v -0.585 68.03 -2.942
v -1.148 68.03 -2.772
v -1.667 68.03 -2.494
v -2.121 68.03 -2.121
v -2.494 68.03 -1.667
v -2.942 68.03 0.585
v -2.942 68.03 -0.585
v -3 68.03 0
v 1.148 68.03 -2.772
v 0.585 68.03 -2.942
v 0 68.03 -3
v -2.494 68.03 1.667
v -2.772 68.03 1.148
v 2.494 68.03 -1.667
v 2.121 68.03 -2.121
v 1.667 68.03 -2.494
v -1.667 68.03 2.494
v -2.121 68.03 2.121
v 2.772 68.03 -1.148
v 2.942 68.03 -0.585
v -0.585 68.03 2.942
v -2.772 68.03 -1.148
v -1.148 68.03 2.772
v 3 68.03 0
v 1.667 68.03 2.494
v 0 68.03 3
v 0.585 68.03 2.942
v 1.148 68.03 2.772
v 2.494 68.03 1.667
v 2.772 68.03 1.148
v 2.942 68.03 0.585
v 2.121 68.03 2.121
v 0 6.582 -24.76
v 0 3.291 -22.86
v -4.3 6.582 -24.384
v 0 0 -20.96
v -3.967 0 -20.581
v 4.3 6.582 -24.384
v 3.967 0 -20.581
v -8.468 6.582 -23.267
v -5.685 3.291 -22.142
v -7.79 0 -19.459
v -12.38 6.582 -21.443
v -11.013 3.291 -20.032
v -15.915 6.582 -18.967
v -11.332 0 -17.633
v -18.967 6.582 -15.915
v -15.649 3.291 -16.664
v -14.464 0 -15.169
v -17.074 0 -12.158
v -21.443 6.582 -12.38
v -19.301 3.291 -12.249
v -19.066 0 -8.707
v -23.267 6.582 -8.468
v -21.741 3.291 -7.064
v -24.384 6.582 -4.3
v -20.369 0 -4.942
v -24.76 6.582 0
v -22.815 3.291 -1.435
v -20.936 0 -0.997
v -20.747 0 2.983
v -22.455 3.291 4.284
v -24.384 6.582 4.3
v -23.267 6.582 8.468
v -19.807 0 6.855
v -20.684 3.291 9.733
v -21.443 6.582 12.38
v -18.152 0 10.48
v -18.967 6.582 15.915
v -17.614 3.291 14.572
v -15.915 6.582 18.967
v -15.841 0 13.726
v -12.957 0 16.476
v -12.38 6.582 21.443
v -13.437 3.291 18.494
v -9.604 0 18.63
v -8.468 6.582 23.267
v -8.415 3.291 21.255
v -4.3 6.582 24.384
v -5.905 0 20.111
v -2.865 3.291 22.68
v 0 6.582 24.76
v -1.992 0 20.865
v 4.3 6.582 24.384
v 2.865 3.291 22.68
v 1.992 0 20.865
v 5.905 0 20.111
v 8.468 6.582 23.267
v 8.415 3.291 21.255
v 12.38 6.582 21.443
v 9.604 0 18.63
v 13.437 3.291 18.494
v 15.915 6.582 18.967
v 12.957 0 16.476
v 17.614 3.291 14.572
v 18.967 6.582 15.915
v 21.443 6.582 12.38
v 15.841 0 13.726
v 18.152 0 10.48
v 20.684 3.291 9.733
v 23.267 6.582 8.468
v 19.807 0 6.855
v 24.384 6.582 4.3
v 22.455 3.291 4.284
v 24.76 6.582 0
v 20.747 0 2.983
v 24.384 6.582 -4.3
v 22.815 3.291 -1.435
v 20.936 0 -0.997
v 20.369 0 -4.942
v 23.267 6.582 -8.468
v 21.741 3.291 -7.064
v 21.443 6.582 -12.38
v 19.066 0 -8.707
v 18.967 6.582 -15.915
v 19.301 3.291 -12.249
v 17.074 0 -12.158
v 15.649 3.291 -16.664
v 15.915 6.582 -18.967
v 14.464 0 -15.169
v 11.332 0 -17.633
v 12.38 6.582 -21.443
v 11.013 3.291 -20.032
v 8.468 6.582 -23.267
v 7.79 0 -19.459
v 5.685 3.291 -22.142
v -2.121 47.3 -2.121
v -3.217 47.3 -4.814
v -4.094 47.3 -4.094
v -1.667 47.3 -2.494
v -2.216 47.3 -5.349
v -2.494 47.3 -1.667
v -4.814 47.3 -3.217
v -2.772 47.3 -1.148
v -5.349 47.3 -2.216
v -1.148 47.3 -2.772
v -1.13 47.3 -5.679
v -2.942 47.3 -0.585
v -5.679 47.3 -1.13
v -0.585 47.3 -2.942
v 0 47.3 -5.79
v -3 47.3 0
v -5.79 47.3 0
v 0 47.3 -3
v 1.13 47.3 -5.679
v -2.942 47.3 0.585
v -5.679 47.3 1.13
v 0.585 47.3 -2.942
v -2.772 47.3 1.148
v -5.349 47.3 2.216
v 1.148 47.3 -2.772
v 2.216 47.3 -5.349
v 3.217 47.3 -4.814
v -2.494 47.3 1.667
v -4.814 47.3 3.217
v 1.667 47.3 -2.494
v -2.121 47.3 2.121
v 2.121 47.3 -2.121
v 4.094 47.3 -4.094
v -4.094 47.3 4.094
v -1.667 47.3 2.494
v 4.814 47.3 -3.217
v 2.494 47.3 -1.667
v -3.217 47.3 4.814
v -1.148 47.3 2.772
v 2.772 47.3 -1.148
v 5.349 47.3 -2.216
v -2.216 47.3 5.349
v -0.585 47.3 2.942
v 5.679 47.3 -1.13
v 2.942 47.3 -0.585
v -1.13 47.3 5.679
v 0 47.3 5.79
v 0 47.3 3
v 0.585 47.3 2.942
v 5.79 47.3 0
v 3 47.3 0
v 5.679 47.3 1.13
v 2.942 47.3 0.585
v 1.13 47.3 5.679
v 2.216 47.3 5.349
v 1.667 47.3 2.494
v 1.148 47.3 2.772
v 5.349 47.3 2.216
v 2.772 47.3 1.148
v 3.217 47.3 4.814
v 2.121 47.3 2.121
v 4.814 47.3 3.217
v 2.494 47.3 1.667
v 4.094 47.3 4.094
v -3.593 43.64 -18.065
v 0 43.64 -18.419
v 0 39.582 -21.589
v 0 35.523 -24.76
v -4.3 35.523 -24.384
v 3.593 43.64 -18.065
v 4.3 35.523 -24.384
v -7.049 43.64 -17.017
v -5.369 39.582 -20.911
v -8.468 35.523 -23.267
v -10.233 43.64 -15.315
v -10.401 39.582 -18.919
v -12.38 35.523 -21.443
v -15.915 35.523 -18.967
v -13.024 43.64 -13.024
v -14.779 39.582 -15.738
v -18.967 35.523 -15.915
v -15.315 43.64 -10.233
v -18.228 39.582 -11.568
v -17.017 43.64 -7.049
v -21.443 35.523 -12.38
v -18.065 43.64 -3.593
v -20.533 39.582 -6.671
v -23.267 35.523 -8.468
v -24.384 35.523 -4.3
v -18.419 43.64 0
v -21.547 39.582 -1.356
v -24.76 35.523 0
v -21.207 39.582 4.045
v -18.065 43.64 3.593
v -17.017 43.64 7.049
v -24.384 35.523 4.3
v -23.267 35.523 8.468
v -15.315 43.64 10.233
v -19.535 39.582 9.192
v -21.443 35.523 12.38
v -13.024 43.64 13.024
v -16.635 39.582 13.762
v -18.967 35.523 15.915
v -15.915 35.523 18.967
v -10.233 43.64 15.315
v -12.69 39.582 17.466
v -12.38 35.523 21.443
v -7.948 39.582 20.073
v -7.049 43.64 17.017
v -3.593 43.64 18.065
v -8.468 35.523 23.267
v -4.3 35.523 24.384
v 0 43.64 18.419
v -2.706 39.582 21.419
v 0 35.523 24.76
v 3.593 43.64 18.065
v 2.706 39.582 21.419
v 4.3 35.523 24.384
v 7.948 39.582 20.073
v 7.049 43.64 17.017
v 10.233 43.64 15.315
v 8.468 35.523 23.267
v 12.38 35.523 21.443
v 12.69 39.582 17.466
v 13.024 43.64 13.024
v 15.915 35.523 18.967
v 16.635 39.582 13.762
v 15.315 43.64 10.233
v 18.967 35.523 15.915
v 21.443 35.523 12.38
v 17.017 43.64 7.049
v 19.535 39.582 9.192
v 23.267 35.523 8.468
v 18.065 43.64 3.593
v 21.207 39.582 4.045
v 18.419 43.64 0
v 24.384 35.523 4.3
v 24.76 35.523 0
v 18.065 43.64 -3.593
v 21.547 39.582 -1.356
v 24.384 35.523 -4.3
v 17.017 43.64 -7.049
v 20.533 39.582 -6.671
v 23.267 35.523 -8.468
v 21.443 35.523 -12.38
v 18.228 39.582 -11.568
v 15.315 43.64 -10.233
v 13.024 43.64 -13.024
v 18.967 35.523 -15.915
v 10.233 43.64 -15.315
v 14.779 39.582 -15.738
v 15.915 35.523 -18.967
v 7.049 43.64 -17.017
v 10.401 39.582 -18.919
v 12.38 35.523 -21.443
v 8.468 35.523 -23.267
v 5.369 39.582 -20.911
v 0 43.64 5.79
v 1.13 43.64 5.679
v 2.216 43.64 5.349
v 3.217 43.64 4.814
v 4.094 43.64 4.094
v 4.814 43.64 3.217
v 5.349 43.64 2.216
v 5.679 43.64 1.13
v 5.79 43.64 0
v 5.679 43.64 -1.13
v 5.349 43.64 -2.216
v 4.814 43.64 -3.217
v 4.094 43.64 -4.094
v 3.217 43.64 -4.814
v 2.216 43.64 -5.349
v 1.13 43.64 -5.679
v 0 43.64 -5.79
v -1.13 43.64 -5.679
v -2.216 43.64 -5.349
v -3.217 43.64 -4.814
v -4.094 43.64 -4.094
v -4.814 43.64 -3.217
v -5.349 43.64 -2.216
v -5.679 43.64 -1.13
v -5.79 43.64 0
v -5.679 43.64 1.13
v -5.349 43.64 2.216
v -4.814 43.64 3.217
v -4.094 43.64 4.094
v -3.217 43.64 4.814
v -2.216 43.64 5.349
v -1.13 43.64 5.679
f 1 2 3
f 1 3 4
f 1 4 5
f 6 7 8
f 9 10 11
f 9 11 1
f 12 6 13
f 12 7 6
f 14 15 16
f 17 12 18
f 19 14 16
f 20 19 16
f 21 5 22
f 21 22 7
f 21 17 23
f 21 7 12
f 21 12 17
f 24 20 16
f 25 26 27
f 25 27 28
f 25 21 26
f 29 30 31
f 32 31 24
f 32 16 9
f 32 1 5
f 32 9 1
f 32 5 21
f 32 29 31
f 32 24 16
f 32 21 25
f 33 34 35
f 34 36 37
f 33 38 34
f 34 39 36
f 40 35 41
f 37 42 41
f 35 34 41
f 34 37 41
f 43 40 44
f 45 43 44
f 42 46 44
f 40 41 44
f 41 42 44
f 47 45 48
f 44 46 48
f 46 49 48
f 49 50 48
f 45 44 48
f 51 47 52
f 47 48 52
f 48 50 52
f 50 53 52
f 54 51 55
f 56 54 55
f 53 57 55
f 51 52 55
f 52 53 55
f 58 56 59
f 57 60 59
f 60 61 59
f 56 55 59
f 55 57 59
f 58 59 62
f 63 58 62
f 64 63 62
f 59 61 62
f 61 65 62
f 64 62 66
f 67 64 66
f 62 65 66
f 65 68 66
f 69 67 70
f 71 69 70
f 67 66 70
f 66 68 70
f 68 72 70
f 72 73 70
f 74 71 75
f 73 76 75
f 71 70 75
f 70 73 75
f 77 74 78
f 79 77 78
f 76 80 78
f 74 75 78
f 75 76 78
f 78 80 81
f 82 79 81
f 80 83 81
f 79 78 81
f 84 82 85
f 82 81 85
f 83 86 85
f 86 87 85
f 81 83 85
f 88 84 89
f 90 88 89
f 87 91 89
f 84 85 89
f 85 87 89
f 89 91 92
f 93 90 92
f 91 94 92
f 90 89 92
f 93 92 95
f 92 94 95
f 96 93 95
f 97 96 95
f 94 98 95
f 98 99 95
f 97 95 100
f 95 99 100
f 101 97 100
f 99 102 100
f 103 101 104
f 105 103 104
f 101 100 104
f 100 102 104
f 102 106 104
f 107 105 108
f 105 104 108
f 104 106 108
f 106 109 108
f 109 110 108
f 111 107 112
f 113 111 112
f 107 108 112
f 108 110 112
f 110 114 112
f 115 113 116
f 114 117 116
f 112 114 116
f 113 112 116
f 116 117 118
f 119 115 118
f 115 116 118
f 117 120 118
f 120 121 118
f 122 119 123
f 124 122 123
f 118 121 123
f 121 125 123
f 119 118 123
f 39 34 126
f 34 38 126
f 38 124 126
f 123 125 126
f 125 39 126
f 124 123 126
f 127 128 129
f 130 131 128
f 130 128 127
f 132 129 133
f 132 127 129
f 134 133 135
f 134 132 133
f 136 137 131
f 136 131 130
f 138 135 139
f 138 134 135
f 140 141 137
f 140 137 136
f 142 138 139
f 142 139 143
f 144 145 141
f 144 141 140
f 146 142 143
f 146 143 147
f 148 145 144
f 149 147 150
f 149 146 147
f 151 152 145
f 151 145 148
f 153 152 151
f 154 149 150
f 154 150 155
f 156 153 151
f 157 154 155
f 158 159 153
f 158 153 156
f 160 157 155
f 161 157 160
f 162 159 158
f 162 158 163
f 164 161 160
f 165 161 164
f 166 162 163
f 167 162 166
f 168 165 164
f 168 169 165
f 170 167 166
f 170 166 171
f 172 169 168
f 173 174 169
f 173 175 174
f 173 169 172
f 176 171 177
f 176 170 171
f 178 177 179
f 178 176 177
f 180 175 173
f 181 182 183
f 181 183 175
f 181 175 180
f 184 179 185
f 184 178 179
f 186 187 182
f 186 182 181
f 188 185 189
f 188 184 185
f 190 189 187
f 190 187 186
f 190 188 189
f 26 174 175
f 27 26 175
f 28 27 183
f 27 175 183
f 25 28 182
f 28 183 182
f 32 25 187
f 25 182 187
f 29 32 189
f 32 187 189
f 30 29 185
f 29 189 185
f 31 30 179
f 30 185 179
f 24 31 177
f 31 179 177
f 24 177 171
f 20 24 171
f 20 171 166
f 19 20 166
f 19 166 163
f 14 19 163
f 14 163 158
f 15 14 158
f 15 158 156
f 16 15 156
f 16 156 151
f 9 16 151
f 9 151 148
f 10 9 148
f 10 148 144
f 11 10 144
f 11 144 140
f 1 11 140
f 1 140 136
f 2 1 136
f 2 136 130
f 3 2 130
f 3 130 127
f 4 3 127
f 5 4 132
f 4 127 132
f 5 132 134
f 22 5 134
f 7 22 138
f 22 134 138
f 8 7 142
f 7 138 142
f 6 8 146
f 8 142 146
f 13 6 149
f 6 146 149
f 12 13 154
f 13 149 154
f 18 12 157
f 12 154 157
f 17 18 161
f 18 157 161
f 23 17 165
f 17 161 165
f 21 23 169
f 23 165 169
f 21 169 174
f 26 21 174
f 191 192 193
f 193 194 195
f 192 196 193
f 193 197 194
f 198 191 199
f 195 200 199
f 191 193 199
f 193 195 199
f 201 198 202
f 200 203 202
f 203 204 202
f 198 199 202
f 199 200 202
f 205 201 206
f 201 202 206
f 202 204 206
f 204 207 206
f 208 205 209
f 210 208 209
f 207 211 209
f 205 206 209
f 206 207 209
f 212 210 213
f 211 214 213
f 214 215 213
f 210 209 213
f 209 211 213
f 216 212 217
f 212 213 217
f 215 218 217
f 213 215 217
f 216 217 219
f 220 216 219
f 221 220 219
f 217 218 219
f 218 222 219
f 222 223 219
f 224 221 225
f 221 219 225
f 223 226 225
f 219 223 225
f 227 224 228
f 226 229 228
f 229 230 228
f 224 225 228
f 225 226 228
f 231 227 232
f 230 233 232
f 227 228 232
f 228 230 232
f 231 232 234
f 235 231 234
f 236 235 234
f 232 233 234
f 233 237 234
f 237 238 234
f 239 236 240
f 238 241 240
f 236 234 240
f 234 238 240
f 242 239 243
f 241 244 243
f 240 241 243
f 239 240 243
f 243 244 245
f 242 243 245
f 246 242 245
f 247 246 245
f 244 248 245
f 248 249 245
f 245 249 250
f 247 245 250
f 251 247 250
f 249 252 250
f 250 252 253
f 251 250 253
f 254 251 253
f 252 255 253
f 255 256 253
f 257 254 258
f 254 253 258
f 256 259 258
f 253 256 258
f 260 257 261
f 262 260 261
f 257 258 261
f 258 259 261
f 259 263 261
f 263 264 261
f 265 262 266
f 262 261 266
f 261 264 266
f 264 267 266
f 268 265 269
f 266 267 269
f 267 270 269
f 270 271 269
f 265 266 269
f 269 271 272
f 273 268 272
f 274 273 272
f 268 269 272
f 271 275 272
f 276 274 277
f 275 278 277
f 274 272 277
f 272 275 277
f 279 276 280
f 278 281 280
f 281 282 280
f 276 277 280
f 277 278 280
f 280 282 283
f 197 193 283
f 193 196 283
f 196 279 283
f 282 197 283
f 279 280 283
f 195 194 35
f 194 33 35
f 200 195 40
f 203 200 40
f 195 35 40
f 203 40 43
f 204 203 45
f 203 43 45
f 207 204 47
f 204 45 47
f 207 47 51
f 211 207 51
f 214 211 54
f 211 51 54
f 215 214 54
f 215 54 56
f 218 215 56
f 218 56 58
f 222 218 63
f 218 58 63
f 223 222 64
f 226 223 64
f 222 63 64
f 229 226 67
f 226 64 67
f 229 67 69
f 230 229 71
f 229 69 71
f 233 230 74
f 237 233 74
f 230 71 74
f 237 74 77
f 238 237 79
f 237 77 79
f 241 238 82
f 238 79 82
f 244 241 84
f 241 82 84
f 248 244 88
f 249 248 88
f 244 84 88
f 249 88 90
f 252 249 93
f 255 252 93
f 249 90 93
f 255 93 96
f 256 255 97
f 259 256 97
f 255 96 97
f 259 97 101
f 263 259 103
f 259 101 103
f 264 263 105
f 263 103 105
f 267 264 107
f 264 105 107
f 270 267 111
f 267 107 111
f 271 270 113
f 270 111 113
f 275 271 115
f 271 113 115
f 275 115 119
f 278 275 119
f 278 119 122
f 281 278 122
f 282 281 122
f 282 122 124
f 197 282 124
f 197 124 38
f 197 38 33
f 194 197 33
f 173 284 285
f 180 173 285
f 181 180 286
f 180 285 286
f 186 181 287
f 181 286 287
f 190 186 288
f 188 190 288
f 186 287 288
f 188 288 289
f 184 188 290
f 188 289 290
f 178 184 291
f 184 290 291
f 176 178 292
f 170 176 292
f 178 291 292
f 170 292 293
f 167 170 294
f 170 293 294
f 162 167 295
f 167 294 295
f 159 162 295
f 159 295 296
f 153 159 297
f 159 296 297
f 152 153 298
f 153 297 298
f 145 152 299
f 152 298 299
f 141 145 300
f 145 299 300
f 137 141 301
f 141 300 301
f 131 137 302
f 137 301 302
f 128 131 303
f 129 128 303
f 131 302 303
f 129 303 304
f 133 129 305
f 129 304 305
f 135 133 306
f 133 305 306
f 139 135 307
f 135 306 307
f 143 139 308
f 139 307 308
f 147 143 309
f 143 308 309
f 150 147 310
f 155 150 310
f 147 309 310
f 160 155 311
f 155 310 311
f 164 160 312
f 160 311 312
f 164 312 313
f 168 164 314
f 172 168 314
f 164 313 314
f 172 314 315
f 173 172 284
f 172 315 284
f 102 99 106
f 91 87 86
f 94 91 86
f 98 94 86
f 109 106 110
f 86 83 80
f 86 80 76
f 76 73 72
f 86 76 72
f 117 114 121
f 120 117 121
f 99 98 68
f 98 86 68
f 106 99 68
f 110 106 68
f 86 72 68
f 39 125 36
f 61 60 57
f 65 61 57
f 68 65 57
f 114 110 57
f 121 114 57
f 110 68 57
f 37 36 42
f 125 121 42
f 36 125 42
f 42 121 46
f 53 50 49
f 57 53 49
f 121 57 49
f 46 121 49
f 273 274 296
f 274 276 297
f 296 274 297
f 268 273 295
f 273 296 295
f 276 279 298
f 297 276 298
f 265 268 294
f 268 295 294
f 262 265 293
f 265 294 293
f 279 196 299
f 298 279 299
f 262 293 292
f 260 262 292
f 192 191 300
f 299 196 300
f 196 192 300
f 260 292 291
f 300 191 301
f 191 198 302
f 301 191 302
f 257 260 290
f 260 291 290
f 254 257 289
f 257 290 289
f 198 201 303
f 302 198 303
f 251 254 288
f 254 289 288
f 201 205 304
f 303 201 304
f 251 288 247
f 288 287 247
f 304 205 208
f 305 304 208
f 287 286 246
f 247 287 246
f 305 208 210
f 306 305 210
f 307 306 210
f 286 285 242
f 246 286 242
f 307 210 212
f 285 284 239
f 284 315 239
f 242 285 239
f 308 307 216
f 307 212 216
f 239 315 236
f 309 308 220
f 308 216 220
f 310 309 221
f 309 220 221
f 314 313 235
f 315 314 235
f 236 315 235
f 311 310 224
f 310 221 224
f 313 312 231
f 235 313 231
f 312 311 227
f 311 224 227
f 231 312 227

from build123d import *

# Parameters (mm, degrees)
SKETCH2_R           = 3
BOSS_EXTRUDE1_DEPTH = 24.39
SKETCH4_R           = 5.79
BOSS_EXTRUDE2_DEPTH = 3.66


with BuildPart() as part:
    # Sketch1 → Revolve1 (revolve)
    with BuildSketch(Plane.XY, mode=Mode.PRIVATE) as revolve1_sk:
        Polygon((0, 0), (0, 43.64), (18.418686804, 43.64), (24.76, 35.523489238), (24.76, 6.581793069), (20.96, 0), align=None)
    revolve(revolve1_sk.sketch.rotate(Axis((0, 0, 0), (0, 1, 0)), 90), axis=Axis((0, 0, 0), (0, 1, 0)))

    # Sketch2 → Boss-Extrude1 (add)
    with BuildSketch(Plane(origin=(0, 43.64, 0), x_dir=(1, 0, 0), z_dir=(0, 1, 0))):
        with Locations(Location((0, 0, 0), (0, 0, 270))):
            Circle(SKETCH2_R)
    extrude(amount=BOSS_EXTRUDE1_DEPTH)

    # Sketch4 → Boss-Extrude2 (add)
    with BuildSketch(Plane(origin=(0, 43.64, 0), x_dir=(1, 0, 0), z_dir=(0, 1, 0))):
        with Locations(Location((0, 0, 0), (0, 0, 270))):
            Circle(SKETCH4_R)
    extrude(amount=BOSS_EXTRUDE2_DEPTH)


solid = part.part
